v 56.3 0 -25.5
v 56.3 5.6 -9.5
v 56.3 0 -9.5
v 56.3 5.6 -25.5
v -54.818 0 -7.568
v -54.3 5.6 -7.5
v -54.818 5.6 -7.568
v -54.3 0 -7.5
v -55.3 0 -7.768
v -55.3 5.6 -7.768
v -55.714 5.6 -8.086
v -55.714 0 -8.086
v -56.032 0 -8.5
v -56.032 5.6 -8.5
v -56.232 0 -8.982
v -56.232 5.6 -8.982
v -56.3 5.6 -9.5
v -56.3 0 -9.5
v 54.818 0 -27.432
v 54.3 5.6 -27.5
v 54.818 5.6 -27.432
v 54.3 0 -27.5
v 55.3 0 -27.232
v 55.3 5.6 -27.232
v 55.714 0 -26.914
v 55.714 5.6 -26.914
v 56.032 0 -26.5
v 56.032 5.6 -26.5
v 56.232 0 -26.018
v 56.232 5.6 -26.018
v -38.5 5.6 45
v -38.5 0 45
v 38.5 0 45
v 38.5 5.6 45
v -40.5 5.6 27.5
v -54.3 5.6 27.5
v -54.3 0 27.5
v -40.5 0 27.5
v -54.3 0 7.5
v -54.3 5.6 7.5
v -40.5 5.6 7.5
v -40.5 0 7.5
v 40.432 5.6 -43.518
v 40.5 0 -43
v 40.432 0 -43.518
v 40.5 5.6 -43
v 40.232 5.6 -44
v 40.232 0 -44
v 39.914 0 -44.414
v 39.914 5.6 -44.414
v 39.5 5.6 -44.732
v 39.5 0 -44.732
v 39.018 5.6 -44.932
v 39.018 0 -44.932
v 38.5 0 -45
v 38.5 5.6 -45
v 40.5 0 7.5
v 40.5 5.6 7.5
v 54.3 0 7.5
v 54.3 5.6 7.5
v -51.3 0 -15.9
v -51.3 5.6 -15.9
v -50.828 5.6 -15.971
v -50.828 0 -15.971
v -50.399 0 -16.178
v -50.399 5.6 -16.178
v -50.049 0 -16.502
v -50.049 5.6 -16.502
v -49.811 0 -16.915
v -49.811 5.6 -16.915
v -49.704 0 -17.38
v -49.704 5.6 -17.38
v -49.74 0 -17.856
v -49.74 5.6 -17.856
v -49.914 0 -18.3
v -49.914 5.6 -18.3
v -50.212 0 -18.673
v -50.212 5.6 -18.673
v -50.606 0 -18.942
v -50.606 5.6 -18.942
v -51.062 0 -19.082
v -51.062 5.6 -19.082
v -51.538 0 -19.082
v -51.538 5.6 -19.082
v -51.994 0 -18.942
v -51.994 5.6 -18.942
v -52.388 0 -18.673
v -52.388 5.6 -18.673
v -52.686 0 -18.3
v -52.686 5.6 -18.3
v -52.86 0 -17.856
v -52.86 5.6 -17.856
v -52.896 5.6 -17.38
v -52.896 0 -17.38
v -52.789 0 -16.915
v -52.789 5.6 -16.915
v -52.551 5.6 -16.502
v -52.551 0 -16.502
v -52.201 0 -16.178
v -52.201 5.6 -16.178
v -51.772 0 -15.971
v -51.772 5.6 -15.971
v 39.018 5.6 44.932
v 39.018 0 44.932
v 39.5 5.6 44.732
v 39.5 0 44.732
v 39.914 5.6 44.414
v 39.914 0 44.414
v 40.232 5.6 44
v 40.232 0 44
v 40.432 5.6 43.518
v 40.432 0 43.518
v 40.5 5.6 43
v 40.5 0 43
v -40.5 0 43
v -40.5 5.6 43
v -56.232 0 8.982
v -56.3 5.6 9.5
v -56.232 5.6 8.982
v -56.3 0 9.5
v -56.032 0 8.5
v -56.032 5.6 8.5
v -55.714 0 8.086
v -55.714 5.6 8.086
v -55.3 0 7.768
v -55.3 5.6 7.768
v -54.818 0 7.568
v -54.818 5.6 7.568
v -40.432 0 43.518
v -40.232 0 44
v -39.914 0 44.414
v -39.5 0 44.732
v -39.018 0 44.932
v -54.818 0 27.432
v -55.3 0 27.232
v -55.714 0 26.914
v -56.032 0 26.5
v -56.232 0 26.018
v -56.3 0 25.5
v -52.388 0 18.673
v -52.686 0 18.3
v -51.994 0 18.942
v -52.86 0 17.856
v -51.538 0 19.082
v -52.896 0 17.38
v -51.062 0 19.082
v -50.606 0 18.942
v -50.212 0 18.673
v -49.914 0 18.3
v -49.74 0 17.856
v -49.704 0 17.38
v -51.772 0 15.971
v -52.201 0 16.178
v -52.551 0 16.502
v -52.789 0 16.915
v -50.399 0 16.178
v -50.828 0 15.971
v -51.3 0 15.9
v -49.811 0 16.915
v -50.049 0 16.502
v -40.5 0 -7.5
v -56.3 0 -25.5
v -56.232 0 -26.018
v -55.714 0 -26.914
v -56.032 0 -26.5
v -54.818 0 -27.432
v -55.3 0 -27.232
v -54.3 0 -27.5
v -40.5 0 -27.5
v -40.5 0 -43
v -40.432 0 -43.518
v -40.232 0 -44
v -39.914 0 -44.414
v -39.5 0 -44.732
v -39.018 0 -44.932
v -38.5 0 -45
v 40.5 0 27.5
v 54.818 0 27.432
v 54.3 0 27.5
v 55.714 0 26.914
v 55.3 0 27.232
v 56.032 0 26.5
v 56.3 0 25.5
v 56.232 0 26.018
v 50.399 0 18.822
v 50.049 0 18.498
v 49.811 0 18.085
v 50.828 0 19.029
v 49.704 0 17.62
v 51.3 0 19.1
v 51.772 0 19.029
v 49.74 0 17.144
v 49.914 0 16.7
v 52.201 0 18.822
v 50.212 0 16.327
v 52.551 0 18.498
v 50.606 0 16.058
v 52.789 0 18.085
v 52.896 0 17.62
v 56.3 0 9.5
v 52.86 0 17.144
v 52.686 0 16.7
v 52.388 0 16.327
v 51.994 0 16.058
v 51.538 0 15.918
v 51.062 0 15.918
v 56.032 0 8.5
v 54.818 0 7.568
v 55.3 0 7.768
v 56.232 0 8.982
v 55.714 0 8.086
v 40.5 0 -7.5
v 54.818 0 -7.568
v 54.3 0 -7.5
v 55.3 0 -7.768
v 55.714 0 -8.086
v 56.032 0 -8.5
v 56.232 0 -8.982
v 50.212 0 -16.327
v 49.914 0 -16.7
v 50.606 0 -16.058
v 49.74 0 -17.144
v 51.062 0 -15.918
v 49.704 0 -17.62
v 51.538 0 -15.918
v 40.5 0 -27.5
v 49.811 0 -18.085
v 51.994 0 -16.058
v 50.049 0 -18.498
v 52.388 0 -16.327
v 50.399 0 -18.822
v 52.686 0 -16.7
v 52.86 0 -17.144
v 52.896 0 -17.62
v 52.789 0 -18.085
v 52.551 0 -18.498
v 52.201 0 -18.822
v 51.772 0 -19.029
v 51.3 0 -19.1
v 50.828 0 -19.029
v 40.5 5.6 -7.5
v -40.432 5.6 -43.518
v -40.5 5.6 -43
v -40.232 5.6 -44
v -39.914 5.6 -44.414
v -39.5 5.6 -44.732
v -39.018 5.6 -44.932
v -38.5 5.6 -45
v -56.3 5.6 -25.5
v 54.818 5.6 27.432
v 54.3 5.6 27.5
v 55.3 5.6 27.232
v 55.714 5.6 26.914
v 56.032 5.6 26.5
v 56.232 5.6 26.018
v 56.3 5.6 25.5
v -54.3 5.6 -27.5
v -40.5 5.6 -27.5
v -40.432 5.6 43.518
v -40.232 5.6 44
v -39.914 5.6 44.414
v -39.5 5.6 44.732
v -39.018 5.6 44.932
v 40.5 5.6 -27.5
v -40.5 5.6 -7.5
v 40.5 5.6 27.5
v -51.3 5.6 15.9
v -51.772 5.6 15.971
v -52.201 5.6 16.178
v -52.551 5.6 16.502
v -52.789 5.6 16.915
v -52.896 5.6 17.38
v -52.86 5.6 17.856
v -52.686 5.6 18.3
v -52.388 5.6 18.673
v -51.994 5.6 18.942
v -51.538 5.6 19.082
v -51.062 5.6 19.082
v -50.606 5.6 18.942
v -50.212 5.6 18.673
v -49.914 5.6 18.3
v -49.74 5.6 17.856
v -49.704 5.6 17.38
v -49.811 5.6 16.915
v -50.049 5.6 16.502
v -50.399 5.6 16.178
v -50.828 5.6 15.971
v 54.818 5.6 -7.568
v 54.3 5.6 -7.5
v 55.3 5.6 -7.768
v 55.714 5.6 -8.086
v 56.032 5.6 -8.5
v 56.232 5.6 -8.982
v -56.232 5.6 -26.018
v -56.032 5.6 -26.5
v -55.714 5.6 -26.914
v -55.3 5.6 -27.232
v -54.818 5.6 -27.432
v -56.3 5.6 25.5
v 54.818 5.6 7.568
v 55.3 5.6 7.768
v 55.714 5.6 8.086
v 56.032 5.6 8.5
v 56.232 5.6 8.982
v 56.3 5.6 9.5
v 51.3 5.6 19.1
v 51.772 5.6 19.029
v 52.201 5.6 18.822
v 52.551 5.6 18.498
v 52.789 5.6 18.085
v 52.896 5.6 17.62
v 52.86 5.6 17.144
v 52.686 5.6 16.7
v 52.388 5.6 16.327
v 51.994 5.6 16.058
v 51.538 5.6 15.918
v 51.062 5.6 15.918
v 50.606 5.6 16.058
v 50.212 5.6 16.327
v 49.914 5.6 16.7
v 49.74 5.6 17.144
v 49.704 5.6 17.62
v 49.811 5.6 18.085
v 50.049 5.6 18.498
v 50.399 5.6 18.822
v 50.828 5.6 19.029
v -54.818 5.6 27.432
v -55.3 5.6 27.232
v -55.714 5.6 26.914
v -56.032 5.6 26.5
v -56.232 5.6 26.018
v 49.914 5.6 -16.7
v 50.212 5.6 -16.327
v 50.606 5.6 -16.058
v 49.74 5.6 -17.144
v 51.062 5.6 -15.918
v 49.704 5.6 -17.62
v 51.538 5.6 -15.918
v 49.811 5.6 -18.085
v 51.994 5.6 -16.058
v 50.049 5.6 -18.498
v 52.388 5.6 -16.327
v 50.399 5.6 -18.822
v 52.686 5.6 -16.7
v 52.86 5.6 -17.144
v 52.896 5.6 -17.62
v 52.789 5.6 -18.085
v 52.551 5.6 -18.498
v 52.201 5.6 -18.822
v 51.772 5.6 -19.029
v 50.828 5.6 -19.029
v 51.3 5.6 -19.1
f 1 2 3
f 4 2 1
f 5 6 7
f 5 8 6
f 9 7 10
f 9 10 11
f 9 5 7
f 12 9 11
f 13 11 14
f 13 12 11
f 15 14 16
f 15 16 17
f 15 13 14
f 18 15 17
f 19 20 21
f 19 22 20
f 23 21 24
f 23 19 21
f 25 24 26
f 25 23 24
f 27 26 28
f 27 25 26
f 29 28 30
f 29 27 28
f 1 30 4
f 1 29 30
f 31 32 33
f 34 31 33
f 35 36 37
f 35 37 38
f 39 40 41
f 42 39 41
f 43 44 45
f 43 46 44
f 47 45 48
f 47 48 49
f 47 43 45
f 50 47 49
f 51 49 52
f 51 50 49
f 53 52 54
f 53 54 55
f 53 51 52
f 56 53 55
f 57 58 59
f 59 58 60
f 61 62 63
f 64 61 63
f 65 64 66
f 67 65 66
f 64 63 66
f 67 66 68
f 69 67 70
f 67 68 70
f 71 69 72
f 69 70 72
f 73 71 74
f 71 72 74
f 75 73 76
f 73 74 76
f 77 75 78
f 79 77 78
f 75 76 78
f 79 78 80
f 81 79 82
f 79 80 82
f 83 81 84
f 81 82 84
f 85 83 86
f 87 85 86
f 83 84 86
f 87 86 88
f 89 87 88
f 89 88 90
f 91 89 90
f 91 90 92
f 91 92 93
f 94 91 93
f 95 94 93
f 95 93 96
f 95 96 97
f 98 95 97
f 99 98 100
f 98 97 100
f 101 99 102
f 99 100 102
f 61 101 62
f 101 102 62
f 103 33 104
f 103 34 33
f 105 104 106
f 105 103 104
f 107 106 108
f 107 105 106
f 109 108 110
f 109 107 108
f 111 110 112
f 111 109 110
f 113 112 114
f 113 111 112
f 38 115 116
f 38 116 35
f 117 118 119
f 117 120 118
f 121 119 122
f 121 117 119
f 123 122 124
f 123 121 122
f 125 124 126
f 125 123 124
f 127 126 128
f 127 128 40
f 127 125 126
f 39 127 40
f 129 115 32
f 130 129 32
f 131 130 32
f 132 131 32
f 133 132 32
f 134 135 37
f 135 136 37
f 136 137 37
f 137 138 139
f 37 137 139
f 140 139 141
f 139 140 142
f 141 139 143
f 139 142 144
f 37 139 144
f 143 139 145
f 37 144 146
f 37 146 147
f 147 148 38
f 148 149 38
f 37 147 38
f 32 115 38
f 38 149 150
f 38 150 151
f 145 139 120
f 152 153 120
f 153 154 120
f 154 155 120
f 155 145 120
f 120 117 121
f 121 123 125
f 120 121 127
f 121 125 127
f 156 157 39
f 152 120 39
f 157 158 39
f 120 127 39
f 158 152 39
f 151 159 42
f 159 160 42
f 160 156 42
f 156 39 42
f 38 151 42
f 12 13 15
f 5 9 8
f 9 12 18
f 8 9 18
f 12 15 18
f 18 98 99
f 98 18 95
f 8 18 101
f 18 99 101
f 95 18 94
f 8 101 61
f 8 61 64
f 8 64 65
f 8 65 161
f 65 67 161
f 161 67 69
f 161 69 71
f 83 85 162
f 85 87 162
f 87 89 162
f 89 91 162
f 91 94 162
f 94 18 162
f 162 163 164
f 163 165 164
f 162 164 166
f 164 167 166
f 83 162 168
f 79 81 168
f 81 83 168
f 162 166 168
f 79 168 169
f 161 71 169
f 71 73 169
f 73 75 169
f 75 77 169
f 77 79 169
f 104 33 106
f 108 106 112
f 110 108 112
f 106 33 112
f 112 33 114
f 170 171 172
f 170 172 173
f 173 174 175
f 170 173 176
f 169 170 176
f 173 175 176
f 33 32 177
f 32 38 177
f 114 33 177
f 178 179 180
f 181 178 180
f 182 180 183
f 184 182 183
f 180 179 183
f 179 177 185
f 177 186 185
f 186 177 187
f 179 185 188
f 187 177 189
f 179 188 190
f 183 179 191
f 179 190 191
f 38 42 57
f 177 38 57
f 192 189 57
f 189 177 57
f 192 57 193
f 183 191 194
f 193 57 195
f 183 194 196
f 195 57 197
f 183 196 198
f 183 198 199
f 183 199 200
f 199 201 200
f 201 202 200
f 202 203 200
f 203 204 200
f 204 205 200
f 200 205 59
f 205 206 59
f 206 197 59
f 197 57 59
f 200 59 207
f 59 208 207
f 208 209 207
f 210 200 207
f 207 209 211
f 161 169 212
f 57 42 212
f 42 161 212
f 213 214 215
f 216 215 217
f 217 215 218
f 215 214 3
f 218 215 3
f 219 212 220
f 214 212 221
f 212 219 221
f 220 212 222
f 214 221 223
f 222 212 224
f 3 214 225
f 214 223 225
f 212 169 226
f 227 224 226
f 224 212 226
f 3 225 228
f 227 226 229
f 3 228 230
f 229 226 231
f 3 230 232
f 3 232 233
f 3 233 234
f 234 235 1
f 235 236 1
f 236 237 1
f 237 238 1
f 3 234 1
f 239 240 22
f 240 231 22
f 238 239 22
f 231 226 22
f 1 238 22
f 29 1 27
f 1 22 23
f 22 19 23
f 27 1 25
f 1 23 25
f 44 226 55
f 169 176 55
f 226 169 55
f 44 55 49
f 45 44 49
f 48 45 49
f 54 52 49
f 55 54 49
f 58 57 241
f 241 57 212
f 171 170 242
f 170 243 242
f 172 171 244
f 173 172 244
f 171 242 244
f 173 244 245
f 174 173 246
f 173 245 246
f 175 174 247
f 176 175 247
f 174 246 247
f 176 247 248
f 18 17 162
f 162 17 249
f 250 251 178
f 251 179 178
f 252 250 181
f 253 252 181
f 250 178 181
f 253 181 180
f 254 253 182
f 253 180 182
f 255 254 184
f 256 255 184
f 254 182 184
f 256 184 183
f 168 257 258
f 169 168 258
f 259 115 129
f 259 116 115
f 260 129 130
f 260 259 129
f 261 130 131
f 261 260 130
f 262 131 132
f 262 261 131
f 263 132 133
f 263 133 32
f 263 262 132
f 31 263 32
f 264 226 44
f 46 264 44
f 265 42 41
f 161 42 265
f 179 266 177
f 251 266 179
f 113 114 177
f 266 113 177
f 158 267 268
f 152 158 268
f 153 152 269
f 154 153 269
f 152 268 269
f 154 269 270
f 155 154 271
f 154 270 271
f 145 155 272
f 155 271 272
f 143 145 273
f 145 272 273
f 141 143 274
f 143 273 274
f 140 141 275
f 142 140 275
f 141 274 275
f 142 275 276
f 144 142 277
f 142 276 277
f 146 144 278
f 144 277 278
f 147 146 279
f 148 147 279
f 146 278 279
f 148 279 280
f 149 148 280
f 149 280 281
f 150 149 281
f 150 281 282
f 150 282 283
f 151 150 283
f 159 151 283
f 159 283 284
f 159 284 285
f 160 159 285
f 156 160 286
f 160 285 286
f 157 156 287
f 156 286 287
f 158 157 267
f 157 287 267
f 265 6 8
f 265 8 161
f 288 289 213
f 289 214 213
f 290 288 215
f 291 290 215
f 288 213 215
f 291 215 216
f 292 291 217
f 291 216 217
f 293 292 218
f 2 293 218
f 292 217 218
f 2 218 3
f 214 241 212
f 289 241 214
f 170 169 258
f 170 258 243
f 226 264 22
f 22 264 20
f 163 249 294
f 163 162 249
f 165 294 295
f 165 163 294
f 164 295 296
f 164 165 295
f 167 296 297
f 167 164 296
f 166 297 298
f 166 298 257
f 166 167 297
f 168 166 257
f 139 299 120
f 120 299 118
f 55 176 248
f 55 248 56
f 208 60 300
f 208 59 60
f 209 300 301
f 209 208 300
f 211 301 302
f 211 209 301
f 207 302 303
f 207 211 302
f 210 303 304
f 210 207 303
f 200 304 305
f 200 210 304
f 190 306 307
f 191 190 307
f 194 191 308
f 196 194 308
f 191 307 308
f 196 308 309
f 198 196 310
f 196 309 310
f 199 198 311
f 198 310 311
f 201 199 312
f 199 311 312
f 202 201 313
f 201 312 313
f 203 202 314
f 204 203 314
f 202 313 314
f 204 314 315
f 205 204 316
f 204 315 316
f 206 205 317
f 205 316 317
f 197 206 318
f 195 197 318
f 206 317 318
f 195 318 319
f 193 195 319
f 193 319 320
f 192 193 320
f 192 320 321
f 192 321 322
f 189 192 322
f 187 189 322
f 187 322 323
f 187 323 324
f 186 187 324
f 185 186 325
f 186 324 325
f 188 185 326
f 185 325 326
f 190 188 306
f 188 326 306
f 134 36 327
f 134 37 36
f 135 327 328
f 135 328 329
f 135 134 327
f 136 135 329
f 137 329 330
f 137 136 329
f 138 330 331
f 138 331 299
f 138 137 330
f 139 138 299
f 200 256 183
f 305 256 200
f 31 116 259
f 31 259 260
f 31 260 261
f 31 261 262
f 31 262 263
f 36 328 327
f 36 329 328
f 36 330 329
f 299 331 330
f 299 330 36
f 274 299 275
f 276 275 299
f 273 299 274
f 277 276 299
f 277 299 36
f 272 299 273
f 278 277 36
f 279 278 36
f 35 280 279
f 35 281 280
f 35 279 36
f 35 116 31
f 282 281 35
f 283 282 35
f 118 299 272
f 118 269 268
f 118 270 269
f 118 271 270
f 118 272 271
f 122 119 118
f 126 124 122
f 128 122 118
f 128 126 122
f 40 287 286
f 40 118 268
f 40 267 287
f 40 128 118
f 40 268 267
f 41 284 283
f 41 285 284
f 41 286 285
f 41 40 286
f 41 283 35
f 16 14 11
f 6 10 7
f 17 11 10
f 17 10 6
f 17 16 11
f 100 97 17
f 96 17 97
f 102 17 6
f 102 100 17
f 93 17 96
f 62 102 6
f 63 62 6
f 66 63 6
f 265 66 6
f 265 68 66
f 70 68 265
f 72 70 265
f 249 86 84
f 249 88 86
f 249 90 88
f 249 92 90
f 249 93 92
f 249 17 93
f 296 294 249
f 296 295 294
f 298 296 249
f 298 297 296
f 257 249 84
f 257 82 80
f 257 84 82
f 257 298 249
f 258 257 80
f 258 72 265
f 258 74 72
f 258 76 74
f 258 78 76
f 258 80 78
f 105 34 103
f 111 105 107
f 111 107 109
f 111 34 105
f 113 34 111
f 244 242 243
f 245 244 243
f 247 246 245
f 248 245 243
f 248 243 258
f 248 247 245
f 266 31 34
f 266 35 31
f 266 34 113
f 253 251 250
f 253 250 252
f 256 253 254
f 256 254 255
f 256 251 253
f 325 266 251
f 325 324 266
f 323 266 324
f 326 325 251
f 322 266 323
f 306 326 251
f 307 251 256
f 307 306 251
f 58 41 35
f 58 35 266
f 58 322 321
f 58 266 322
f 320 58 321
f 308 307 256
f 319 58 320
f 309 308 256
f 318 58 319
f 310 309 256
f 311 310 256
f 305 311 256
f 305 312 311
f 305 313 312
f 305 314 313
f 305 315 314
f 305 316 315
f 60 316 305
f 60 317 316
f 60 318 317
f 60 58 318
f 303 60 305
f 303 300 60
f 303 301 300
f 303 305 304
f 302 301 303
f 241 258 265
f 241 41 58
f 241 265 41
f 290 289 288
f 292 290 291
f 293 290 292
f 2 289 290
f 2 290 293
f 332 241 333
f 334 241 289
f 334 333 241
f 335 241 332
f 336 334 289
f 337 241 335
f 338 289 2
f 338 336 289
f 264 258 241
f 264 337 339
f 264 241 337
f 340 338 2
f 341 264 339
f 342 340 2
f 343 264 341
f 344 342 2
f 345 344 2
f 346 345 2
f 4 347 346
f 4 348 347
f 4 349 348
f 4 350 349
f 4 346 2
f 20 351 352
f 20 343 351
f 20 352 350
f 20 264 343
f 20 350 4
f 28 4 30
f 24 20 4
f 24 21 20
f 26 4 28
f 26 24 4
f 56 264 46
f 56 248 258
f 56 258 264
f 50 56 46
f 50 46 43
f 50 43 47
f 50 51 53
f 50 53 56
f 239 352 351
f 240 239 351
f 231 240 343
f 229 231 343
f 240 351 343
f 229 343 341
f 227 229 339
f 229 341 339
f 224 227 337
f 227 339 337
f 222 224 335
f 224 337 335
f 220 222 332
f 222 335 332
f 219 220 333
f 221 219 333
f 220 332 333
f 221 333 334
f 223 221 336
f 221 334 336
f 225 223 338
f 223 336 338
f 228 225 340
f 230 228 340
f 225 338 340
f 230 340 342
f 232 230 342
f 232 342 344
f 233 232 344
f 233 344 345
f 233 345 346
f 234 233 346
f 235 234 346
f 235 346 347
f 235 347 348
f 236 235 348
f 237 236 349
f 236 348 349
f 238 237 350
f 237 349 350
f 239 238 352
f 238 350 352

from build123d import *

# Parameters (mm, degrees)
SKETCH_1_W      = 81
SKETCH_1_H      = 90
EXTRUDE_1_DEPTH = 5.6
SKETCH_2_W      = 15.8
SKETCH_2_H      = 20
SKETCH_2_R      = 1.6
EXTRUDE_2_DEPTH = 5.6
FILLET_1_R      = 2


with BuildPart() as part:
    # ｽｹｯﾁ1 → ﾎﾞｽ - 押し出し1 (new body)
    with BuildSketch(Plane(origin=(0, 0, 0), x_dir=(1, 0, 0), z_dir=(0, 1, 0))):
        Rectangle(SKETCH_1_W, SKETCH_1_H)
    extrude(amount=EXTRUDE_1_DEPTH)

    # ｽｹｯﾁ2 → ﾎﾞｽ - 押し出し2 (add)
    # profile 1 of 4: a face of its own
    with BuildSketch(Plane(origin=(0, 5.6, 0), x_dir=(1, 0, 0), z_dir=(0, 1, 0))):
        with Locations((-48.4, 17.5)):
            Rectangle(SKETCH_2_W, SKETCH_2_H)
        with Locations(Location((-51.3, 17.5, 0), (0, 0, 270))):
            Circle(SKETCH_2_R, mode=Mode.SUBTRACT)
    # profile 2 of 4: a face of its own
    with BuildSketch(Plane(origin=(0, 5.6, 0), x_dir=(1, 0, 0), z_dir=(0, 1, 0))):
        with Locations((48.4, 17.5)):
            Rectangle(SKETCH_2_W, SKETCH_2_H)
        with Locations(Location((51.3, 17.5, 0), (0, 0, 90))):
            Circle(SKETCH_2_R, mode=Mode.SUBTRACT)
    # profile 3 of 4: a face of its own
    with BuildSketch(Plane(origin=(0, 5.6, 0), x_dir=(1, 0, 0), z_dir=(0, 1, 0))):
        with Locations((-48.4, -17.5)):
            Rectangle(SKETCH_2_W, SKETCH_2_H)
        with Locations(Location((-51.3, -17.5, 0), (0, 0, 90))):
            Circle(SKETCH_2_R, mode=Mode.SUBTRACT)
    # profile 4 of 4: a face of its own
    with BuildSketch(Plane(origin=(0, 5.6, 0), x_dir=(1, 0, 0), z_dir=(0, 1, 0))):
        with Locations((48.4, -17.5)):
            Rectangle(SKETCH_2_W, SKETCH_2_H)
        with Locations(Location((51.3, -17.5, 0), (0, 0, 270))):
            Circle(SKETCH_2_R, mode=Mode.SUBTRACT)
    extrude(amount=-EXTRUDE_2_DEPTH)

    # ﾌｨﾚｯﾄ1
    fillet_1_edges = [part.edges().sort_by_distance(p)[0] for p in [
        (56.3, 2.8, -27.5),
        (56.3, 2.8, -7.5),
        (-56.3, 2.8, -27.5),
        (-56.3, 2.8, -7.5),
        (-56.3, 2.8, 27.5),
        (-56.3, 2.8, 7.5),
        (56.3, 2.8, 27.5),
        (56.3, 2.8, 7.5),
        (40.5, 2.8, 45),
        (-40.5, 2.8, 45),
        (-40.5, 2.8, -45),
        (40.5, 2.8, -45),
    ]]
    fillet(fillet_1_edges, radius=FILLET_1_R)


solid = part.part
